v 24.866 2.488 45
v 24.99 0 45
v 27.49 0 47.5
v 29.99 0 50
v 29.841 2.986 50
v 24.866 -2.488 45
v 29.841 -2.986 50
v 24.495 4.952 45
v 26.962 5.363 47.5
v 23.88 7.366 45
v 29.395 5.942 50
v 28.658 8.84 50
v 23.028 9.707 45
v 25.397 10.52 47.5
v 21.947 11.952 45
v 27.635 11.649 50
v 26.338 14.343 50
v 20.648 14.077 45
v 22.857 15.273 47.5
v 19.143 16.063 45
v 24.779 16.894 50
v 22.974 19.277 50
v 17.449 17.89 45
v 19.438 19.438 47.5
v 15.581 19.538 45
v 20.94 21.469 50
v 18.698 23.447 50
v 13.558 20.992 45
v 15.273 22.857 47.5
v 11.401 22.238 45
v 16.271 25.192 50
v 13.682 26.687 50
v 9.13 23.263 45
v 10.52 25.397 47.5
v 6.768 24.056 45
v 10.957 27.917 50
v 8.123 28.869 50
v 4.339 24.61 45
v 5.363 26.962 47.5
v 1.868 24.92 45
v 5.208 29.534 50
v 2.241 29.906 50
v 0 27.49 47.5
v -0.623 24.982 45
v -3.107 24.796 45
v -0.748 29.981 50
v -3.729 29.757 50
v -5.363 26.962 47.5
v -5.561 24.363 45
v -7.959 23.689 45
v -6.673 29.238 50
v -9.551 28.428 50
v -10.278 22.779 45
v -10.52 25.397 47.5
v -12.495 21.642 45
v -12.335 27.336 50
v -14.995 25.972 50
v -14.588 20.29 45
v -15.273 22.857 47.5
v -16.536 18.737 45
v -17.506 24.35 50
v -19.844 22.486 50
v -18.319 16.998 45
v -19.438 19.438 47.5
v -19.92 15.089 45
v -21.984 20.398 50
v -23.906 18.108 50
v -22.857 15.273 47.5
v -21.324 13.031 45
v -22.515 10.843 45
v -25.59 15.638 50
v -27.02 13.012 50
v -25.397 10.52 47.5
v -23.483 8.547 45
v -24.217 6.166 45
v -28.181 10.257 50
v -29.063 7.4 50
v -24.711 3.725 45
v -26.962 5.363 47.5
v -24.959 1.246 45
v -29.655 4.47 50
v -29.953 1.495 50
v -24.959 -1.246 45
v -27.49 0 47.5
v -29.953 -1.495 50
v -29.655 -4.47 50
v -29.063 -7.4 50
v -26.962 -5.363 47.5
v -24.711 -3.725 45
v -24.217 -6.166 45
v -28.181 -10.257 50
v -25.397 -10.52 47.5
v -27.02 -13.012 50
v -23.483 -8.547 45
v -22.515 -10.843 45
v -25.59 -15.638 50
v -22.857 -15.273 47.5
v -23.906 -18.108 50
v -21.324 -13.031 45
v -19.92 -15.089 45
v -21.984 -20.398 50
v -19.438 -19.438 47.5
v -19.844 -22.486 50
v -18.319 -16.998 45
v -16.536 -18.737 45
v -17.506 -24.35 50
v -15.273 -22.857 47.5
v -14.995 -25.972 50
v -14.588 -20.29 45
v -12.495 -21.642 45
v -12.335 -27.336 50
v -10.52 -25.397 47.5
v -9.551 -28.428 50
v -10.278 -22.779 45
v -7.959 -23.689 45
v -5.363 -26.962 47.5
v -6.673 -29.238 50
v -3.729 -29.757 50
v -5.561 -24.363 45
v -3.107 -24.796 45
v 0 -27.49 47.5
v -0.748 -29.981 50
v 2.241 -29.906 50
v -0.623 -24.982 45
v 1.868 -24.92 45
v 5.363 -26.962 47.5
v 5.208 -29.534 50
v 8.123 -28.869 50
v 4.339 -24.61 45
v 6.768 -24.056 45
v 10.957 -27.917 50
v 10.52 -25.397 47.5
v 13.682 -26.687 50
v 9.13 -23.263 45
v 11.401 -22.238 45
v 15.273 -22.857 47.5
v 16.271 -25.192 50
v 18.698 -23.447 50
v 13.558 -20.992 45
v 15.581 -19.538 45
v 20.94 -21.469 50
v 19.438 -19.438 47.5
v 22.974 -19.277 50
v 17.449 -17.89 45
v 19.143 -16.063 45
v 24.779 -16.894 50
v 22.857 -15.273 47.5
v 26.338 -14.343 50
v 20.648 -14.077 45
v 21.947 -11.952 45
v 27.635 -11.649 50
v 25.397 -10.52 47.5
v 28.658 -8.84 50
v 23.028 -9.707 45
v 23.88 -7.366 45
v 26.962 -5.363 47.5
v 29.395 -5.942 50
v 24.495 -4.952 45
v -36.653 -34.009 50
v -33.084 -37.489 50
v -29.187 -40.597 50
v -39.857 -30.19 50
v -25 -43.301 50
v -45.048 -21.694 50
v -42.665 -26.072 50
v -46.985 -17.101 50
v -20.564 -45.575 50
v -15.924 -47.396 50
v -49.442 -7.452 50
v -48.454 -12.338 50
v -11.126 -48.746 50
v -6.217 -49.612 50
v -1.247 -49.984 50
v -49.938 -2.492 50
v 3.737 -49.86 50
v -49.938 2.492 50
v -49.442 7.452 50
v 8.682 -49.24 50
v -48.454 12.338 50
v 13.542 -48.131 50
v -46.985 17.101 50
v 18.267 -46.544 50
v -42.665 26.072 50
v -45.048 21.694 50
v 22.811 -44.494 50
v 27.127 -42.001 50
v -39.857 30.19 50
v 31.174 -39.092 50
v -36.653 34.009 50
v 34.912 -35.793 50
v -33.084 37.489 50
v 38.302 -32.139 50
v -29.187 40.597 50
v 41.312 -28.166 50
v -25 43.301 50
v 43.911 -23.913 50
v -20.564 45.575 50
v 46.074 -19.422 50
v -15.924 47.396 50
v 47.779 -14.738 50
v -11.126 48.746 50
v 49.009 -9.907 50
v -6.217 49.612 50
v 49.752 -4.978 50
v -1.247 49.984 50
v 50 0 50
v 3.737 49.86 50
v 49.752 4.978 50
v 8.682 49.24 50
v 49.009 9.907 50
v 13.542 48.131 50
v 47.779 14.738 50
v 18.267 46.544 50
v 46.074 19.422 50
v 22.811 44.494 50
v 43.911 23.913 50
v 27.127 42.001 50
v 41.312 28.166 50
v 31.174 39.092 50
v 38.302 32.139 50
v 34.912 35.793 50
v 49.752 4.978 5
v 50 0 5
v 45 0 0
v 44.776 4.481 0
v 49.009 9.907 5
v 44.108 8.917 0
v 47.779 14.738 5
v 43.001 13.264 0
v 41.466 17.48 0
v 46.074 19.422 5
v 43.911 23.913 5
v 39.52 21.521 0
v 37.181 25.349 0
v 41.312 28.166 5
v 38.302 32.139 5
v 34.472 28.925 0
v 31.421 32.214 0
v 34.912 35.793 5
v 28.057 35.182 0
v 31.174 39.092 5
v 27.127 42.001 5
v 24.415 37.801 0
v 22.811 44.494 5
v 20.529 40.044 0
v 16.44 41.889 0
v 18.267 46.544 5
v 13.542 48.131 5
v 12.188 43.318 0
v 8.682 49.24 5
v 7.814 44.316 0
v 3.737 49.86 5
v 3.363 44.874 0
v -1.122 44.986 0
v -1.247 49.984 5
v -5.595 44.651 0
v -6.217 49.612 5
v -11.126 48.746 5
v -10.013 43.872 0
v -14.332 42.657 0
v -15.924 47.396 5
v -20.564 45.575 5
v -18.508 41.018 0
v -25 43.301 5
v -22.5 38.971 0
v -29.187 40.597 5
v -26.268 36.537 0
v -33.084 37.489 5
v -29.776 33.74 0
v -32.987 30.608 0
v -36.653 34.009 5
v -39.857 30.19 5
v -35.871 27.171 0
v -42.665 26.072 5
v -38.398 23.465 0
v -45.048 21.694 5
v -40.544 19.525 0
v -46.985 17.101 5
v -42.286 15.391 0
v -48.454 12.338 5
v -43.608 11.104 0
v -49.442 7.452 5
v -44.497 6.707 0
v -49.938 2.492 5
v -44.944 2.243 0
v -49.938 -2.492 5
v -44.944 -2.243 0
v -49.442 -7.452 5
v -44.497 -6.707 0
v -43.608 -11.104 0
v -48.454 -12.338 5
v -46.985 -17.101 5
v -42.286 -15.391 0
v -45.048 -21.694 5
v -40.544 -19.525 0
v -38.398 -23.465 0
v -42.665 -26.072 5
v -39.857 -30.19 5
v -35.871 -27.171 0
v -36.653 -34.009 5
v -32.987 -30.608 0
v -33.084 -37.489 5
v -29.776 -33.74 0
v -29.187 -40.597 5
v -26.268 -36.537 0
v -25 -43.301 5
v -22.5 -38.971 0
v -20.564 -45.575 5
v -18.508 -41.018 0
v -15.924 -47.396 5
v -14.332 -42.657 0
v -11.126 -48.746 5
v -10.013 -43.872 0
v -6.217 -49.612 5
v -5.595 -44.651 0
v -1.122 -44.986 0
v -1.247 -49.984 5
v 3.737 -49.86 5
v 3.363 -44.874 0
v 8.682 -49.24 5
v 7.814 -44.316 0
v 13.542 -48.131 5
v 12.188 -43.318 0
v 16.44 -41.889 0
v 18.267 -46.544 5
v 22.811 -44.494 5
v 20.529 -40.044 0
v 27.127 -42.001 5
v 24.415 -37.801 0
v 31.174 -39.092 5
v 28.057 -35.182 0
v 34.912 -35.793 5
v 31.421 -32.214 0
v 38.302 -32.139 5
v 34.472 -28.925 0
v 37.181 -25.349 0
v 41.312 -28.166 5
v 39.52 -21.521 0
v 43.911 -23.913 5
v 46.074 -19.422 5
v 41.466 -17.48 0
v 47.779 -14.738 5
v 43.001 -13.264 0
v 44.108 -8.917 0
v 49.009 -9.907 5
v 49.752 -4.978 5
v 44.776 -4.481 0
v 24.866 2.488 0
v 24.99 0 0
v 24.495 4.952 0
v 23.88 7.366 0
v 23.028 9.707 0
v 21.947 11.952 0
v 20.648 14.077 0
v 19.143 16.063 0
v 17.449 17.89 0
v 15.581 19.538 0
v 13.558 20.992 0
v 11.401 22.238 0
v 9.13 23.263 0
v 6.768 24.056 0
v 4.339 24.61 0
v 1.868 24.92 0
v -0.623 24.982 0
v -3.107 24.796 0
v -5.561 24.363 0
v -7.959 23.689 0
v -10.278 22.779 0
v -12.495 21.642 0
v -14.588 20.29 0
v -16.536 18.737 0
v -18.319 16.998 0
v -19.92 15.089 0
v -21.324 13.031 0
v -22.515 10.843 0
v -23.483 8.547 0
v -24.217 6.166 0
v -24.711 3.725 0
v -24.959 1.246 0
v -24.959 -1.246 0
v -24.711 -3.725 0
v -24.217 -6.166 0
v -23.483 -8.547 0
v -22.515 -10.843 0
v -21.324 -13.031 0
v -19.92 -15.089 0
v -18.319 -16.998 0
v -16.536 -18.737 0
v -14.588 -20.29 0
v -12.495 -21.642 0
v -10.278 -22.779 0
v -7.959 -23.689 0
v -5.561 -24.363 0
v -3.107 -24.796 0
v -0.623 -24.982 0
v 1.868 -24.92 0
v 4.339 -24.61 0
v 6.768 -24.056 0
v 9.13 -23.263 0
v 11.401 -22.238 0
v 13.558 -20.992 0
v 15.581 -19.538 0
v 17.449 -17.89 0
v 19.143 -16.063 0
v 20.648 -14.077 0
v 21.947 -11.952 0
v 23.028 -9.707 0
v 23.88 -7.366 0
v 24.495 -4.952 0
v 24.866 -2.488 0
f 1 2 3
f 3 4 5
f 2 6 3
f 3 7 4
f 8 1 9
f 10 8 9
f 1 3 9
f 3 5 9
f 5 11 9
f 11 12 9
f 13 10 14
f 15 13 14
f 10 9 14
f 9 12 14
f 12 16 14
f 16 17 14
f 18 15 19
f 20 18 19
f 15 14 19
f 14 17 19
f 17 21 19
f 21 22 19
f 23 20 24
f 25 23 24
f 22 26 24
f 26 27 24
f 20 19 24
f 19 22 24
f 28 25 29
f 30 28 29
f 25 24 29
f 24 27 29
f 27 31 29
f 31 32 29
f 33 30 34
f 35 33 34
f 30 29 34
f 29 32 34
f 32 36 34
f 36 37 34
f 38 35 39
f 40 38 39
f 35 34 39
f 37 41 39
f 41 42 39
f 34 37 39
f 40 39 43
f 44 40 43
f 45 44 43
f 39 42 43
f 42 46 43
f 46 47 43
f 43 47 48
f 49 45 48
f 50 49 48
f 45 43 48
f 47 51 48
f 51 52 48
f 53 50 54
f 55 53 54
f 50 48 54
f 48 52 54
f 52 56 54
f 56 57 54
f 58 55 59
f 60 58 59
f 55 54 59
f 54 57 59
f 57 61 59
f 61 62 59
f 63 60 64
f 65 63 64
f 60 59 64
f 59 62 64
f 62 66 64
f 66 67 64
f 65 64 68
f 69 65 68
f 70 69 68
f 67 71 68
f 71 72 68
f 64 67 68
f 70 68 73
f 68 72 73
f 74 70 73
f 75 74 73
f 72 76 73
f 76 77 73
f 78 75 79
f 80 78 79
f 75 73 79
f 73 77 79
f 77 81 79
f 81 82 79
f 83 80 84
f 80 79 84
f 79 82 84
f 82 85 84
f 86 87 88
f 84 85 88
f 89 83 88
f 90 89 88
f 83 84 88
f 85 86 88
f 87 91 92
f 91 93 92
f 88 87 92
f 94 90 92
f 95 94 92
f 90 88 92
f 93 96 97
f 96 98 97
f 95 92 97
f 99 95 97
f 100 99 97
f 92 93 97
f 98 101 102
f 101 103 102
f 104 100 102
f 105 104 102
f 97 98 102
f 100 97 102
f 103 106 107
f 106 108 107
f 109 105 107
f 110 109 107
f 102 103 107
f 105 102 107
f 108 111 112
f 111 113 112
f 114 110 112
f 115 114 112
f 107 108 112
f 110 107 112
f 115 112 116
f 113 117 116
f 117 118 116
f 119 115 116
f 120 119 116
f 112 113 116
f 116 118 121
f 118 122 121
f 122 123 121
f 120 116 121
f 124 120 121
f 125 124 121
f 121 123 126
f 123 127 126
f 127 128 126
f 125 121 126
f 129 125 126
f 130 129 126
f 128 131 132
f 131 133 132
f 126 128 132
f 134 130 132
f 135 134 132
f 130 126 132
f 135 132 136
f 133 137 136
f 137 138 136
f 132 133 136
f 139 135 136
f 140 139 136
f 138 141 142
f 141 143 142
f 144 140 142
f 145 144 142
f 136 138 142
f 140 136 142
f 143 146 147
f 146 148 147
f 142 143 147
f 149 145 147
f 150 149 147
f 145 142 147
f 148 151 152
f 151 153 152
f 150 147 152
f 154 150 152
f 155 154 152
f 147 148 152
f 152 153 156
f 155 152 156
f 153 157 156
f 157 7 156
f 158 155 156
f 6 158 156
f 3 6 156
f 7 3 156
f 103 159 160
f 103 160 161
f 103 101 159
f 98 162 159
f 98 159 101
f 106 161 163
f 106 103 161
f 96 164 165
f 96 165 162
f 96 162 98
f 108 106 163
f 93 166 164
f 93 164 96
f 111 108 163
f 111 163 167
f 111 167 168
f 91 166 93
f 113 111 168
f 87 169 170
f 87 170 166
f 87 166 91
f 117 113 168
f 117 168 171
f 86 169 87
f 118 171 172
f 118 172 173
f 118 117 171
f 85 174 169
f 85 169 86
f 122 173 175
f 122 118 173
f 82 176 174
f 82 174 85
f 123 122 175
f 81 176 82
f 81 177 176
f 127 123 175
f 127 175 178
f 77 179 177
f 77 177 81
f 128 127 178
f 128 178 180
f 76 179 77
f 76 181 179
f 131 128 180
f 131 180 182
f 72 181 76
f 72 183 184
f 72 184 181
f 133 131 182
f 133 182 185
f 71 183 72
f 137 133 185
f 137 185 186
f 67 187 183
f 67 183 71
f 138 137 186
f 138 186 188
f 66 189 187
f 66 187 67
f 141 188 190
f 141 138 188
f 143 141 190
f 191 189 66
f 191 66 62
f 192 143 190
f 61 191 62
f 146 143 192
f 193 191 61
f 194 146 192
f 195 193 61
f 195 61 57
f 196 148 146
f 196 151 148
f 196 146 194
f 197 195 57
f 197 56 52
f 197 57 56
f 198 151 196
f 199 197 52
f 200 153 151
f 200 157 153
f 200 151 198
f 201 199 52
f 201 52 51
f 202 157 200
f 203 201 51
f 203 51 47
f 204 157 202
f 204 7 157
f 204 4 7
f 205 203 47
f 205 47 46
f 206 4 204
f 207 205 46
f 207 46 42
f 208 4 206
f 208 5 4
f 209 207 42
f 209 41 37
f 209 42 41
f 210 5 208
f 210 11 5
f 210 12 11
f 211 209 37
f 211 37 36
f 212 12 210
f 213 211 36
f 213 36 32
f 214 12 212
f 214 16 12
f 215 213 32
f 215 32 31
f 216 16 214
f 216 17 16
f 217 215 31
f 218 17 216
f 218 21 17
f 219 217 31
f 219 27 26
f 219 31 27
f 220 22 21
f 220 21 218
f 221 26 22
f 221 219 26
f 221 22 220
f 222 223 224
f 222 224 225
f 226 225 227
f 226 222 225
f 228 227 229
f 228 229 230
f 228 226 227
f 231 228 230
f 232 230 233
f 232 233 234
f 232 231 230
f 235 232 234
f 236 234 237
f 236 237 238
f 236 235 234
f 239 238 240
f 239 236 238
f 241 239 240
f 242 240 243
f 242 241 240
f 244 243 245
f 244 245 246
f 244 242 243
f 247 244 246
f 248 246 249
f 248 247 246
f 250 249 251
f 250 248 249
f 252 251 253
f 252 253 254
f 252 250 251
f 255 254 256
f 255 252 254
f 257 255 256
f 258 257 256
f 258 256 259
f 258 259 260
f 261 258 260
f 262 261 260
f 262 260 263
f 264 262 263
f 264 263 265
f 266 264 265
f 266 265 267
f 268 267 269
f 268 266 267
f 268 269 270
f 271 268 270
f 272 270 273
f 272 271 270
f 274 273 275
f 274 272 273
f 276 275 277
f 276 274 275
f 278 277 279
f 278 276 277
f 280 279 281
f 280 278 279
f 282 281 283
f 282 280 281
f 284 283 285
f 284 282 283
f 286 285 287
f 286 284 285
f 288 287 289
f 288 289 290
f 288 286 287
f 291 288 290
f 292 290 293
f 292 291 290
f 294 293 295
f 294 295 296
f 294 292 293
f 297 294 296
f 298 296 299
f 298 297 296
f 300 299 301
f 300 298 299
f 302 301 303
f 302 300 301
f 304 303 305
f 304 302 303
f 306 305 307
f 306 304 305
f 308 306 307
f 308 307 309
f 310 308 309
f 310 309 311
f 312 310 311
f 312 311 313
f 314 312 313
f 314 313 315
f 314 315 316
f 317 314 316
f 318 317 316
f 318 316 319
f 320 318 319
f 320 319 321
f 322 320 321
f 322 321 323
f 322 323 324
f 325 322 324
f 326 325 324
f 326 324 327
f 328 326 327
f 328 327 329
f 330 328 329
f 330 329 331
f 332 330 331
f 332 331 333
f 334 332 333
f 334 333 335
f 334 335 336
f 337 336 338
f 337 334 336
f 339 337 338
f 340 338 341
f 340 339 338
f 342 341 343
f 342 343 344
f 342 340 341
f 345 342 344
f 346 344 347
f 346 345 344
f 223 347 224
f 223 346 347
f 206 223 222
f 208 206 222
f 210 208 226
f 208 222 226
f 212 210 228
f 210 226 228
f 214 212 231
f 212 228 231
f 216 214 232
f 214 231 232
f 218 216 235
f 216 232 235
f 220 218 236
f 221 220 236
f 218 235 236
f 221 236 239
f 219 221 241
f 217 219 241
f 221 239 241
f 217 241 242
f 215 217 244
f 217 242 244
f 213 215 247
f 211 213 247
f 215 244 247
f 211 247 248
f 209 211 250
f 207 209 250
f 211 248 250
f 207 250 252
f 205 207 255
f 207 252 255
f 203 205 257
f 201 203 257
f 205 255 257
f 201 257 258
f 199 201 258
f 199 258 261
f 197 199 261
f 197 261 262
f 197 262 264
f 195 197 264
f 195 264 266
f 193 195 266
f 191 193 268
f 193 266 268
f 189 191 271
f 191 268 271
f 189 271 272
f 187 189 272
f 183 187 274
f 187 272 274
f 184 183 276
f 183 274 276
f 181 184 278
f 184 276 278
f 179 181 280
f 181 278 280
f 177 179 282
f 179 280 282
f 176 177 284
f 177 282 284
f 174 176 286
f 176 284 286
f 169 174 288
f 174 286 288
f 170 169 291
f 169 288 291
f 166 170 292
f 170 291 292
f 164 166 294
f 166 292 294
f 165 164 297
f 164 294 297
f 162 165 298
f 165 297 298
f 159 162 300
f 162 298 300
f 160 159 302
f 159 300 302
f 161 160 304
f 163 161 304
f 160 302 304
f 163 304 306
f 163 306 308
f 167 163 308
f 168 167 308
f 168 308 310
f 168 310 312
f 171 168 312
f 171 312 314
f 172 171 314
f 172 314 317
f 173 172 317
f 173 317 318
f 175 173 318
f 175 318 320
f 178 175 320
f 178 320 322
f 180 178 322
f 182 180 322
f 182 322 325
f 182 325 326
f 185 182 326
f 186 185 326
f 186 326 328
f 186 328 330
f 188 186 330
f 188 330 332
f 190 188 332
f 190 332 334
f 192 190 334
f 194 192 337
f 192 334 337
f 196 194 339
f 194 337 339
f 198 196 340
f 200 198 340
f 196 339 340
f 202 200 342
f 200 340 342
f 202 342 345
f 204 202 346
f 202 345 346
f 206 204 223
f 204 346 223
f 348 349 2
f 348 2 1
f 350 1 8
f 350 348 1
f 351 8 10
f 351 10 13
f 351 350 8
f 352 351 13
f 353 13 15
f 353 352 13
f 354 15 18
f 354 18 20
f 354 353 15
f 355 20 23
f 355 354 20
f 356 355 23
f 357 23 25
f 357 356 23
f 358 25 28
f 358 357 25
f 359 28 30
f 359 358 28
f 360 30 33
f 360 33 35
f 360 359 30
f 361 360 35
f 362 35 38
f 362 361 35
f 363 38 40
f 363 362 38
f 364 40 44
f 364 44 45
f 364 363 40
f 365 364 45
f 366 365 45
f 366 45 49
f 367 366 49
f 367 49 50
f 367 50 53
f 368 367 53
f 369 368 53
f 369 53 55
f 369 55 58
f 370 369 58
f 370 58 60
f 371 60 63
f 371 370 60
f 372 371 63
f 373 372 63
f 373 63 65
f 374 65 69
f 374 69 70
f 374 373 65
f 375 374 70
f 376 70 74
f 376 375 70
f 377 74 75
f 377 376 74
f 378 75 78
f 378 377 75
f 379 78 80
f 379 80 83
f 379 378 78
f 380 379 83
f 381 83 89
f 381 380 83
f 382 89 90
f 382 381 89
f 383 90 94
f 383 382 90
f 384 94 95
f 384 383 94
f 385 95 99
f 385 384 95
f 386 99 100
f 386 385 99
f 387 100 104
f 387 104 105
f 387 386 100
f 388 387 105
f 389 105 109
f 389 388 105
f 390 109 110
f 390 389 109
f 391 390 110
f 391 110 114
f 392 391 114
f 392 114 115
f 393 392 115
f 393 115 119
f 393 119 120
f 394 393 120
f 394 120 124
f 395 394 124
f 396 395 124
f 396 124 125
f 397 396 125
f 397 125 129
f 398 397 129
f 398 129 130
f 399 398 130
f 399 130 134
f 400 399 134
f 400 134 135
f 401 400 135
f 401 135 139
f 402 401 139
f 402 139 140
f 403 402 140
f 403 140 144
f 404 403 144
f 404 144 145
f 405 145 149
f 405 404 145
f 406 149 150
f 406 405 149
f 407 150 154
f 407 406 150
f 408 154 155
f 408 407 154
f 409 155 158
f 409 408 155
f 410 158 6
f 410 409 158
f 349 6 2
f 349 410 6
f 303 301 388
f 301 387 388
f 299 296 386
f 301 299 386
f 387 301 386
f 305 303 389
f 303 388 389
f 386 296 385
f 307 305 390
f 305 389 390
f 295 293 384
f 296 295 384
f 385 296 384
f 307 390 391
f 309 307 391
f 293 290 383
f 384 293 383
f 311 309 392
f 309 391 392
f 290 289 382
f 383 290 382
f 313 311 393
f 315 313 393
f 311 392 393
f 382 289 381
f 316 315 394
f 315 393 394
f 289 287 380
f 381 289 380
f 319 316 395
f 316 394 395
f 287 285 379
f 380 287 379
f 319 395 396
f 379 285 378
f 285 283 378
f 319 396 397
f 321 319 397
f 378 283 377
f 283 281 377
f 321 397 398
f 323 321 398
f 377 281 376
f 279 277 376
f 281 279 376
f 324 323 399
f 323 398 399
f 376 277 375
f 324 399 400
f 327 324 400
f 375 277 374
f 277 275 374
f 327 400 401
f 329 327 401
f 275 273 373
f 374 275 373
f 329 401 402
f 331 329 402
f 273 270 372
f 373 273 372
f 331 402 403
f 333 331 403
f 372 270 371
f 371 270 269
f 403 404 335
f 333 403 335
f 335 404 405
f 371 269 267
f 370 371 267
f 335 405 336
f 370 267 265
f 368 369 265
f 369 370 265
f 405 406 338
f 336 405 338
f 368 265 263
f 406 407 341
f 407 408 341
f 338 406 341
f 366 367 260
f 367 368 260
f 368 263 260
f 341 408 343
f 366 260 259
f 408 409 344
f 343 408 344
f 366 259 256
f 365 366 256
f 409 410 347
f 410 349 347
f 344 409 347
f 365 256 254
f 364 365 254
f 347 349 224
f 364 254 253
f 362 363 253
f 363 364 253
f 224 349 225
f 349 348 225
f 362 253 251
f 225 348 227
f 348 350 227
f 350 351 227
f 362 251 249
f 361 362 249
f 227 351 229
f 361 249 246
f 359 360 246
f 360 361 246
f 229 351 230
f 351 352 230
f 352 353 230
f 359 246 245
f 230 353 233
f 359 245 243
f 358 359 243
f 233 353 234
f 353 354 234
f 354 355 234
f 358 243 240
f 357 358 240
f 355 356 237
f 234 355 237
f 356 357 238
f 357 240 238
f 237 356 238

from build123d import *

# Parameters (mm, degrees)
F0_R     = 50
F0_R_2   = 24.99
F1_DEPTH = 50
F2_SIZE  = 5
F3_SIZE  = 5


with BuildPart() as f1:
    # F0 (on Top) → F1 (new body)
    with BuildSketch(Plane.XY):
        Circle(F0_R)
        Circle(F0_R_2, mode=Mode.SUBTRACT)
    extrude(amount=F1_DEPTH)

    # F2
    f2_edges = [f1.edges().sort_by_distance(p)[0] for p in [
        (-24.99, 0, 50),
    ]]
    chamfer(f2_edges, length=F2_SIZE)

    # F3
    f3_edges = [f1.edges().sort_by_distance(p)[0] for p in [
        (-50, 0, 0),
    ]]
    chamfer(f3_edges, length=F3_SIZE)


solid = f1.part
